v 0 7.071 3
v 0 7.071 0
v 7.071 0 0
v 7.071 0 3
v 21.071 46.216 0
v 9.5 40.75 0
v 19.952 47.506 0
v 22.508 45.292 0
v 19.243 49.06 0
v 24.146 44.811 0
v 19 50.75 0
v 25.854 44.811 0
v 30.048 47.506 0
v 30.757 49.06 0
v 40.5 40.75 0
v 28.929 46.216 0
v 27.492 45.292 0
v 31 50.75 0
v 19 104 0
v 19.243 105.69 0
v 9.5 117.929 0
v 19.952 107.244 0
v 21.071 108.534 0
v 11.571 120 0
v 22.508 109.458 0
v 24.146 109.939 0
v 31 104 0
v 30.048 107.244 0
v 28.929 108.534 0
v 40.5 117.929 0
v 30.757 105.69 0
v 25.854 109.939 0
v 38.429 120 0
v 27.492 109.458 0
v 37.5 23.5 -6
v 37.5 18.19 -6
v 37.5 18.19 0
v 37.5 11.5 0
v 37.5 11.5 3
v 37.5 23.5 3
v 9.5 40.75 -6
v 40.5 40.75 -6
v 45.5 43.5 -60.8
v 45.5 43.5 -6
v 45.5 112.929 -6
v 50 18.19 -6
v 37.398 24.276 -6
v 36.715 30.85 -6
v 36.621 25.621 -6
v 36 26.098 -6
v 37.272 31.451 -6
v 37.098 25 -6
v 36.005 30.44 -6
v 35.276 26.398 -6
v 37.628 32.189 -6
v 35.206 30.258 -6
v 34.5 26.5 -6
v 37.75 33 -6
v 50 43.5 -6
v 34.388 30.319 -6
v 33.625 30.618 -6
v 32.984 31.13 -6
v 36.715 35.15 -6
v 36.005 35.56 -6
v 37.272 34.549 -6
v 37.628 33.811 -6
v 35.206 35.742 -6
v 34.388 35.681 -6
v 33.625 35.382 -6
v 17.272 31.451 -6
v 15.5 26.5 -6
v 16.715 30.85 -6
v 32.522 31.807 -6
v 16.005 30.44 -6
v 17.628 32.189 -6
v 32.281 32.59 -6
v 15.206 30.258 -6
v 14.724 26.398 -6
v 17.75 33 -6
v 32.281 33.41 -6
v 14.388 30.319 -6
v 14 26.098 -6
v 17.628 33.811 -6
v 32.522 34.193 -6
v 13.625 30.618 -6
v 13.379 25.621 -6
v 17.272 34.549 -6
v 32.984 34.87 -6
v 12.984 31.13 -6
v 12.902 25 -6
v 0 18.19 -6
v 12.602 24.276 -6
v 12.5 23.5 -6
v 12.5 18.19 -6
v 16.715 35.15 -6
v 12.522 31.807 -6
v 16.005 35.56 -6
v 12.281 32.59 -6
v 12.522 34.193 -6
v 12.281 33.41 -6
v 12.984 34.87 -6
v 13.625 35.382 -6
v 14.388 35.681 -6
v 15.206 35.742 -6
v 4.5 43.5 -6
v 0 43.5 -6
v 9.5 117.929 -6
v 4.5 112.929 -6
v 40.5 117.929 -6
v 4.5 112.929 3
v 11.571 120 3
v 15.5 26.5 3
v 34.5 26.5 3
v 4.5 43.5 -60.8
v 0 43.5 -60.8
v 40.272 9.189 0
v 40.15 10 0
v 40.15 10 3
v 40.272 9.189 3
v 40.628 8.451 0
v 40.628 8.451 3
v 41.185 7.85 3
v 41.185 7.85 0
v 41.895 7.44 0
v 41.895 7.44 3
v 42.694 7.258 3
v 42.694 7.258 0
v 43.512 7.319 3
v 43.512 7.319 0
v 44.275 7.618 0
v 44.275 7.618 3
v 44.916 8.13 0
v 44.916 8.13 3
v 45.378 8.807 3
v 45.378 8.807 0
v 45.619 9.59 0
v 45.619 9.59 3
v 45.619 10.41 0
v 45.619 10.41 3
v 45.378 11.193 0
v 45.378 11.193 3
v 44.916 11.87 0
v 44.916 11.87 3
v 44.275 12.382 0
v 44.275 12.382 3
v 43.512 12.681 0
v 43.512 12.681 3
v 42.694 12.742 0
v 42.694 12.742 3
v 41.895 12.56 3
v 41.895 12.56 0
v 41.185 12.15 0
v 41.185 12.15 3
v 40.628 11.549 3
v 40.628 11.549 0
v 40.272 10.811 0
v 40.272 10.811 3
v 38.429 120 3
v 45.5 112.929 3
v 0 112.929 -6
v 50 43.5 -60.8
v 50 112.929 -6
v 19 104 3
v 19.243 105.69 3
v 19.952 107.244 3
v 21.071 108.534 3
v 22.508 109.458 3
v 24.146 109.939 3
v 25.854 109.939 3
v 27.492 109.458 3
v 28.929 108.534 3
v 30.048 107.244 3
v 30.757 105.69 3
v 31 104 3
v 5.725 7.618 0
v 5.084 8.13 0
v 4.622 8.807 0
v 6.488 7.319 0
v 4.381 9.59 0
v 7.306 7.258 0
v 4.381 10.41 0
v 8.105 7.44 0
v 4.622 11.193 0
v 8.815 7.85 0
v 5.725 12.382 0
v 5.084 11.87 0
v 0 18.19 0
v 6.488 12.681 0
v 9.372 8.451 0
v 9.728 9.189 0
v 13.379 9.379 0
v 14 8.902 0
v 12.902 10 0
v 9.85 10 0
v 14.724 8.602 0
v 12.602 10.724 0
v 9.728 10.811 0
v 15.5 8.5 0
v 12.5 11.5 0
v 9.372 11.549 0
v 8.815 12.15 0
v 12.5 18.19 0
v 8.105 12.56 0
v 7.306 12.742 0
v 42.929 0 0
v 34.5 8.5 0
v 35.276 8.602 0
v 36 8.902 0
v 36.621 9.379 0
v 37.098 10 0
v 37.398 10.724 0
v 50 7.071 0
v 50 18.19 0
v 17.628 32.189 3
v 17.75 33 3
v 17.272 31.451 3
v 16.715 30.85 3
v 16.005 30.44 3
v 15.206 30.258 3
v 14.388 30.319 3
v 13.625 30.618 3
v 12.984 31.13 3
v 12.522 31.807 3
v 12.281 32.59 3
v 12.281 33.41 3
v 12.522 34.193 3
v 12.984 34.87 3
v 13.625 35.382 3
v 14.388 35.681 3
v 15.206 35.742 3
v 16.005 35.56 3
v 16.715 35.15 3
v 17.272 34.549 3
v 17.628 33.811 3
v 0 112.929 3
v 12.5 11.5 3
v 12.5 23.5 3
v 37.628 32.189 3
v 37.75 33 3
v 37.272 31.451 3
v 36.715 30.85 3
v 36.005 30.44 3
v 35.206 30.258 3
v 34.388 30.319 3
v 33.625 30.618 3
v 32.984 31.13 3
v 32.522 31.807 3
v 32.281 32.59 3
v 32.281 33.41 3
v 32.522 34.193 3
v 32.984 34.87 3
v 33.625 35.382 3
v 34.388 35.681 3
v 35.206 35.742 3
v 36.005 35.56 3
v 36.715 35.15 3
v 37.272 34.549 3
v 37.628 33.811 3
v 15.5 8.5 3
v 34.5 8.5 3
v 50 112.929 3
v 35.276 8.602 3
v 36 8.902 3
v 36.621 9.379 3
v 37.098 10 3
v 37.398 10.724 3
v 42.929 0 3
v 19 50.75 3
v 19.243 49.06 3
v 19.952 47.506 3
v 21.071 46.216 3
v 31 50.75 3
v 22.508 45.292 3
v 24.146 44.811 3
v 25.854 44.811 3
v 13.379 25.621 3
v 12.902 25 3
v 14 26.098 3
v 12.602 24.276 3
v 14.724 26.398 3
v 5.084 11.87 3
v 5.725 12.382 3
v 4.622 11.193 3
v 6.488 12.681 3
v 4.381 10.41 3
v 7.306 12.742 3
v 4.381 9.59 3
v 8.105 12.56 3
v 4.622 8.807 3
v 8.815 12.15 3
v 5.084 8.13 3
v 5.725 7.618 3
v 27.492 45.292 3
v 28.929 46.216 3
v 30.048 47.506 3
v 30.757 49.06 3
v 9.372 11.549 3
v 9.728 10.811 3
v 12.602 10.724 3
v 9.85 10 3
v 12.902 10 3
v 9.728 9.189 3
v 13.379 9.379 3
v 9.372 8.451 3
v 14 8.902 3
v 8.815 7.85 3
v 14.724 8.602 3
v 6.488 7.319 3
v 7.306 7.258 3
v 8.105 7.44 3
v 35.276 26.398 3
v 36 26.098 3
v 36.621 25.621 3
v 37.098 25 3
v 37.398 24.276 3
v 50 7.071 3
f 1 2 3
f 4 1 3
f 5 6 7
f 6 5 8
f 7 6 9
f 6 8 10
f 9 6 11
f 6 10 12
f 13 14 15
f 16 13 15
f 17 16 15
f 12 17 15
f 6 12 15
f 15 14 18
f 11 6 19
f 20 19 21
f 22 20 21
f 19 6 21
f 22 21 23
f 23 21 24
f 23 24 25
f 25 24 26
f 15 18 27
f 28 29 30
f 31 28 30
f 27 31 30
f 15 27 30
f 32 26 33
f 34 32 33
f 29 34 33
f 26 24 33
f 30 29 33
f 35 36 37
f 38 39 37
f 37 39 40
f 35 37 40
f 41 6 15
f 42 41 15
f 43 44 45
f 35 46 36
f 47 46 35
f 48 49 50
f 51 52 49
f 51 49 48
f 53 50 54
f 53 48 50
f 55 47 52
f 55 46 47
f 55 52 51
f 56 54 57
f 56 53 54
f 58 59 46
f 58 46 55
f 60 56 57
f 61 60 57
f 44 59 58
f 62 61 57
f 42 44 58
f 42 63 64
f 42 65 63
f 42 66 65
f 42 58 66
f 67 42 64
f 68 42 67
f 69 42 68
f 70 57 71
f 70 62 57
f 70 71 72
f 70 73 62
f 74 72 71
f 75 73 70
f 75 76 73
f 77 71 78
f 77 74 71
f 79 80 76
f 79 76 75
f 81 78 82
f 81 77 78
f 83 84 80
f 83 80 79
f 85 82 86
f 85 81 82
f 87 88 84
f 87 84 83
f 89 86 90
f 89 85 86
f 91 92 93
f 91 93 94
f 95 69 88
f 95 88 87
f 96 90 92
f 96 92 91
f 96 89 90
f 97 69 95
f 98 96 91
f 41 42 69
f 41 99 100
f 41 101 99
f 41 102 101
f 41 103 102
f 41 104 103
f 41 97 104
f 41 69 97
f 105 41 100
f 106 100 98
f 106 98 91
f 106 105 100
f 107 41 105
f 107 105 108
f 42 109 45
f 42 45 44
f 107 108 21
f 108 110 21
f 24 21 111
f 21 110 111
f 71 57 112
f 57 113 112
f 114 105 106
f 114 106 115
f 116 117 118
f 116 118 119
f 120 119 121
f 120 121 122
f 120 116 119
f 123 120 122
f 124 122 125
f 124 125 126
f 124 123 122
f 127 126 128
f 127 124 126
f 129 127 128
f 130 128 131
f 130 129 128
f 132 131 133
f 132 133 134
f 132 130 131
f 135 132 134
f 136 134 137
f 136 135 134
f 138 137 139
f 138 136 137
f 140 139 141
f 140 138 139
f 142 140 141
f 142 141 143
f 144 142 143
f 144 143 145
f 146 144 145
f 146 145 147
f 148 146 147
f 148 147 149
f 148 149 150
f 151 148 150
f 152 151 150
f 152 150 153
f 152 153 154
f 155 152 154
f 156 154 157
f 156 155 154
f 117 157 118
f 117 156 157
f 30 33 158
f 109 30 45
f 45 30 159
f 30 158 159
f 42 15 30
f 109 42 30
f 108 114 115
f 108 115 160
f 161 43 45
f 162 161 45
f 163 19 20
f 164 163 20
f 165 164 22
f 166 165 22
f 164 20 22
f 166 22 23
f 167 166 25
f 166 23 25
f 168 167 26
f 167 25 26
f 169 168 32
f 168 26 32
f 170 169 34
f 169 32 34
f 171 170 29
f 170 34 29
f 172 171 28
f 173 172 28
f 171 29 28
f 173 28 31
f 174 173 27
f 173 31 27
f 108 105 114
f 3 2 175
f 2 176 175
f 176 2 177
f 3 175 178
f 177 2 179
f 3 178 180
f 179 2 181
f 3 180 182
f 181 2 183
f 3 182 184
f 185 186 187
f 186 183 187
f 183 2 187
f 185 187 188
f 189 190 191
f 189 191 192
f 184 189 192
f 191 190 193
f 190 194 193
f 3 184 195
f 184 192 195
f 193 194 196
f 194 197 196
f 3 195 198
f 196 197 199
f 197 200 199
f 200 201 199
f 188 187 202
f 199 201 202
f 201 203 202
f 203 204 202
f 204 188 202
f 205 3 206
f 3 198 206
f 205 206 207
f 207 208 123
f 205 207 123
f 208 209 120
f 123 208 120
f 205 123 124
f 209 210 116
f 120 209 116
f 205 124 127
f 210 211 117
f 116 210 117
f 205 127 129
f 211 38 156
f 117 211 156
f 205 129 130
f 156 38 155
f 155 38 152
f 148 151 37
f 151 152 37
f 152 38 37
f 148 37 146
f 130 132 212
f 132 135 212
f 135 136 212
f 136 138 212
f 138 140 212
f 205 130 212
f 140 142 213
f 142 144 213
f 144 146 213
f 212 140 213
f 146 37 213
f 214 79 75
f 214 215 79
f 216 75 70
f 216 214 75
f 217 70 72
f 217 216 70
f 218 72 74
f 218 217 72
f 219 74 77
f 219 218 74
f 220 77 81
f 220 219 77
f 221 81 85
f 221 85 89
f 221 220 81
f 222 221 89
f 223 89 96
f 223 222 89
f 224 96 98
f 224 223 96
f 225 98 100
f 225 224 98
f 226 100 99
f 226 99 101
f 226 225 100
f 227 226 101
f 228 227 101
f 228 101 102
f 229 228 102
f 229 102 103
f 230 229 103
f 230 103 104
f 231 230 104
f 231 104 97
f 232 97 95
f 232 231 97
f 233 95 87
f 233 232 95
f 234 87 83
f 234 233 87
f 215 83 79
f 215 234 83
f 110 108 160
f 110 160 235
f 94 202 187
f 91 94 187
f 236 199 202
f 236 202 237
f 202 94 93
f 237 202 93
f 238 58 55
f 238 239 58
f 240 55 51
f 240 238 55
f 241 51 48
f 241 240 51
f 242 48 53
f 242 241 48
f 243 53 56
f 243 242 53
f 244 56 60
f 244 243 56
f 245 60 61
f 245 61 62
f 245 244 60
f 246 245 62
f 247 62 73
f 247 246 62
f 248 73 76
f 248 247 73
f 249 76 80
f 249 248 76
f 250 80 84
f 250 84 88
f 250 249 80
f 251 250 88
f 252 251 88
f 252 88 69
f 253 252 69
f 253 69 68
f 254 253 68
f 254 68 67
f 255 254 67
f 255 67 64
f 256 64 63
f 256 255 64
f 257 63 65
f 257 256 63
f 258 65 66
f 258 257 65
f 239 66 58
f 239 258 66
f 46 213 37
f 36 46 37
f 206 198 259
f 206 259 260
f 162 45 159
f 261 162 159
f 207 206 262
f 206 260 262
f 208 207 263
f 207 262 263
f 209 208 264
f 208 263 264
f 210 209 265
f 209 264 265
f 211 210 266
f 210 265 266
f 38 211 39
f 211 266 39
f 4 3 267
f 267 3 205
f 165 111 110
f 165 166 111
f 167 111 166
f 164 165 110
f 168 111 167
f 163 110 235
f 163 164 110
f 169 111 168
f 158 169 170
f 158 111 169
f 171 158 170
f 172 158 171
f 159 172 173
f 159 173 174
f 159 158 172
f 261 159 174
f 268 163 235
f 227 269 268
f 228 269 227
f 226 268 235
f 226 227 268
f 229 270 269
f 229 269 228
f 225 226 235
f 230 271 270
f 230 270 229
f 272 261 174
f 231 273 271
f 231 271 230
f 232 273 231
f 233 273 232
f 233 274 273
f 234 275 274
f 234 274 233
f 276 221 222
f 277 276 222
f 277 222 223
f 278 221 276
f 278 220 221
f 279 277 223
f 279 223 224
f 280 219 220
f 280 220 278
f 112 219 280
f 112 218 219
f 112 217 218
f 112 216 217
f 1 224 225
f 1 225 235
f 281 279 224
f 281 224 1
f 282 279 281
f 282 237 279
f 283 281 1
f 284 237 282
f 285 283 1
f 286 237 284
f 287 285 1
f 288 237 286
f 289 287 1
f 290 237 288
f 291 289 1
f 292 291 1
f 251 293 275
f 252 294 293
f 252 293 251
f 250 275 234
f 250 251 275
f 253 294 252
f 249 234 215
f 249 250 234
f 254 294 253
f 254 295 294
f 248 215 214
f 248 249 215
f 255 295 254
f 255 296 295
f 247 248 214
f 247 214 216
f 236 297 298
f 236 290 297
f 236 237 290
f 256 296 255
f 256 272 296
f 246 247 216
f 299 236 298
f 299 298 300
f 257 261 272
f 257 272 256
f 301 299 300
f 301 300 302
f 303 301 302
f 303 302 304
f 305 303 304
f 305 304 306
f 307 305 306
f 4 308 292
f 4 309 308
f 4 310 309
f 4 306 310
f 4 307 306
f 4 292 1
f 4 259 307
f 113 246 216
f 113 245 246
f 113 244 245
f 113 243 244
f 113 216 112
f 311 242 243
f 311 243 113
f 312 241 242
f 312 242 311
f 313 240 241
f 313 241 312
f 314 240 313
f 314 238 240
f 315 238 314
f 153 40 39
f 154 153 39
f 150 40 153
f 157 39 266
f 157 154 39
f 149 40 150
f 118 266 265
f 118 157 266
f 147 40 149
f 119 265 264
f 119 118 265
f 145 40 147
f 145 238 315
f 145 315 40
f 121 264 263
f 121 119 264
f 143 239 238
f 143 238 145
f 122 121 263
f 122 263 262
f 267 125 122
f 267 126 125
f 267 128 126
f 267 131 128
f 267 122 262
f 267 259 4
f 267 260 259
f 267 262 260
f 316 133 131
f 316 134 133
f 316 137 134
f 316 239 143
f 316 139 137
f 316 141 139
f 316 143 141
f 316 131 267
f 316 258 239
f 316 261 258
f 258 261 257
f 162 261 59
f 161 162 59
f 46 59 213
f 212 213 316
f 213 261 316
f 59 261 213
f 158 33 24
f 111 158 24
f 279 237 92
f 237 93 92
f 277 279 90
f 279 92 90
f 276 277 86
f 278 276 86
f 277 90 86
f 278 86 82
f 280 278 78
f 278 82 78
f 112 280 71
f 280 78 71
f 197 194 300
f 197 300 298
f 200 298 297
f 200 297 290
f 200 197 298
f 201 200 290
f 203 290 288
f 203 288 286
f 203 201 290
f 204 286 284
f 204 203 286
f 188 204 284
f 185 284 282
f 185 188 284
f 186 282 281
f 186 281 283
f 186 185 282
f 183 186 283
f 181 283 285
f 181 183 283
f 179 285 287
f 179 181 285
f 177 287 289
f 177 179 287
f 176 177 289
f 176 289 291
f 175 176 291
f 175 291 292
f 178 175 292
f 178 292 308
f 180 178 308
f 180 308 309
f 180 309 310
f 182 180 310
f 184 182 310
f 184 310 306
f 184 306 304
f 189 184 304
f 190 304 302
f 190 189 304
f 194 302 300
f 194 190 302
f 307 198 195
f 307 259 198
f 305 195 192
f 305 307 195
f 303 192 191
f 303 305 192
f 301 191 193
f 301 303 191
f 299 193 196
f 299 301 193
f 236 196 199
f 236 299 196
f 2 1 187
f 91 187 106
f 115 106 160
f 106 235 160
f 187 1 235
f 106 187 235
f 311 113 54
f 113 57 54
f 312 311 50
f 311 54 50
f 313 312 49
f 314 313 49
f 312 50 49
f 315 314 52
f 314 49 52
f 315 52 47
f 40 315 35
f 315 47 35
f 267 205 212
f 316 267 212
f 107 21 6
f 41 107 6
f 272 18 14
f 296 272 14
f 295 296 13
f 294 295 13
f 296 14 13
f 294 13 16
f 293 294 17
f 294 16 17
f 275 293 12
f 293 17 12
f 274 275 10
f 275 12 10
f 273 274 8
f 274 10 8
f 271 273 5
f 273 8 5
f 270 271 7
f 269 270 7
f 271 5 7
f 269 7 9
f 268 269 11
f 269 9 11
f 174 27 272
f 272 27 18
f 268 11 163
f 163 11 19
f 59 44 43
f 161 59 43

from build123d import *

# Parameters (mm, degrees)
SKETCH1_R           = 2.75
SKETCH1_W           = 25
SKETCH1_H           = 18
BOSS_EXTRUDE1_DEPTH = 3
CUT_EXTRUDE1_REACH  = 132.035
SKETCH3_R           = 2.75
SKETCH2_R           = 2.75
BOSS_EXTRUDE2_DEPTH = 6
FILLET1_R           = 3
BOSS_EXTRUDE5_DEPTH = 4.5
BOSS_EXTRUDE6_DEPTH = 4.5


with BuildPart() as part:
    # Sketch1 → Boss-Extrude1 (new body)
    with BuildSketch(Plane.XY):
        Polygon((7.071067812, 0), (42.928932188, 0), (50, 7.071067812), (50, 43.5), (45.5, 48), (45.5, 112.928932188), (38.428932188, 120), (11.571067812, 120), (4.5, 112.928932188), (4.5, 48), (0, 43.5), (0, 7.071067812), align=None)
        with Locations((7.1, 10)):
            Circle(SKETCH1_R, mode=Mode.SUBTRACT)
        with Locations(Location((42.9, 10, 0), (0, 0, 180))):
            Circle(SKETCH1_R, mode=Mode.SUBTRACT)
        with BuildLine():
            Line((19, 50.75), (19, 104))
            ThreePointArc((19, 104), (25, 110), (31, 104))
            Line((31, 104), (31, 50.75))
            ThreePointArc((31, 50.75), (25, 44.75), (19, 50.75))
        make_face(mode=Mode.SUBTRACT)
        with Locations((25, 17.5)):
            Rectangle(SKETCH1_W, SKETCH1_H, mode=Mode.SUBTRACT)
    extrude(amount=BOSS_EXTRUDE1_DEPTH)

    # Sketch3 → Cut-Extrude1 (cut, up to next)
    with BuildSketch(Plane.XY.offset(3), mode=Mode.PRIVATE) as cut_extrude1_sk1:
        with Locations((15, 33)):
            Circle(SKETCH3_R)
    cut_extrude1_tool1 = extrude(cut_extrude1_sk1.sketch, amount=-CUT_EXTRUDE1_REACH, mode=Mode.PRIVATE) & part.part
    # Sketch3 → Cut-Extrude1 (cut, up to next)
    with BuildSketch(Plane.XY.offset(3), mode=Mode.PRIVATE) as cut_extrude1_sk2:
        with Locations((35, 33)):
            Circle(SKETCH3_R)
    cut_extrude1_tool2 = extrude(cut_extrude1_sk2.sketch, amount=-CUT_EXTRUDE1_REACH, mode=Mode.PRIVATE) & part.part
    add(cut_extrude1_tool1.solids().sort_by_distance((15, 33, 3))[0], mode=Mode.SUBTRACT)
    add(cut_extrude1_tool2.solids().sort_by_distance((35, 33, 3))[0], mode=Mode.SUBTRACT)

    # Sketch2 → Boss-Extrude2 (add)
    with BuildSketch(Plane(origin=(0, 0, 0), x_dir=(-1, 0, 0), z_dir=(0, 0, -1))):
        Polygon((-50, 18.19), (-37.5, 18.19), (-37.5, 26.5), (-12.5, 26.5), (-12.5, 18.19), (0, 18.19), (0, 43.5), (-4.5, 48), (-4.5, 112.928932188), (-9.5, 117.928932188), (-9.5, 40.75), (-40.5, 40.75), (-40.5, 117.928932188), (-45.5, 112.928932188), (-45.5, 48), (-50, 43.5), align=None)
        with Locations(Location((-35, 33, 0), (0, 0, 180))):
            Circle(SKETCH2_R, mode=Mode.SUBTRACT)
        with Locations(Location((-15, 33, 0), (0, 0, 180))):
            Circle(SKETCH2_R, mode=Mode.SUBTRACT)
    extrude(amount=BOSS_EXTRUDE2_DEPTH)

    # Fillet1
    fillet1_edges = [part.edges().sort_by_distance(p)[0] for p in [
        (37.5, 8.5, 1.5),
        (37.5, 26.5, -3),
        (12.5, 26.5, -3),
        (12.5, 8.5, 1.5),
    ]]
    fillet(fillet1_edges, radius=FILLET1_R)

    # Sketch4 → Boss-Extrude5 (add)
    with BuildSketch(Plane(origin=(45.5, 0, 0), x_dir=(0, 0, -1), z_dir=(1, 0, 0))):
        Polygon((-3, 43.5), (60.8, 43.5), (6, 112.928932188), (-3, 112.928932188), align=None)
    extrude(amount=BOSS_EXTRUDE5_DEPTH)

    # Sketch7 → Boss-Extrude6 (add)
    with BuildSketch(Plane.ZY.offset(-4.5)):
        Polygon((3, 112.928932188), (3, 43.5), (-60.8, 43.5), (-6, 112.928932188), align=None)
    extrude(amount=BOSS_EXTRUDE6_DEPTH)


solid = part.part
